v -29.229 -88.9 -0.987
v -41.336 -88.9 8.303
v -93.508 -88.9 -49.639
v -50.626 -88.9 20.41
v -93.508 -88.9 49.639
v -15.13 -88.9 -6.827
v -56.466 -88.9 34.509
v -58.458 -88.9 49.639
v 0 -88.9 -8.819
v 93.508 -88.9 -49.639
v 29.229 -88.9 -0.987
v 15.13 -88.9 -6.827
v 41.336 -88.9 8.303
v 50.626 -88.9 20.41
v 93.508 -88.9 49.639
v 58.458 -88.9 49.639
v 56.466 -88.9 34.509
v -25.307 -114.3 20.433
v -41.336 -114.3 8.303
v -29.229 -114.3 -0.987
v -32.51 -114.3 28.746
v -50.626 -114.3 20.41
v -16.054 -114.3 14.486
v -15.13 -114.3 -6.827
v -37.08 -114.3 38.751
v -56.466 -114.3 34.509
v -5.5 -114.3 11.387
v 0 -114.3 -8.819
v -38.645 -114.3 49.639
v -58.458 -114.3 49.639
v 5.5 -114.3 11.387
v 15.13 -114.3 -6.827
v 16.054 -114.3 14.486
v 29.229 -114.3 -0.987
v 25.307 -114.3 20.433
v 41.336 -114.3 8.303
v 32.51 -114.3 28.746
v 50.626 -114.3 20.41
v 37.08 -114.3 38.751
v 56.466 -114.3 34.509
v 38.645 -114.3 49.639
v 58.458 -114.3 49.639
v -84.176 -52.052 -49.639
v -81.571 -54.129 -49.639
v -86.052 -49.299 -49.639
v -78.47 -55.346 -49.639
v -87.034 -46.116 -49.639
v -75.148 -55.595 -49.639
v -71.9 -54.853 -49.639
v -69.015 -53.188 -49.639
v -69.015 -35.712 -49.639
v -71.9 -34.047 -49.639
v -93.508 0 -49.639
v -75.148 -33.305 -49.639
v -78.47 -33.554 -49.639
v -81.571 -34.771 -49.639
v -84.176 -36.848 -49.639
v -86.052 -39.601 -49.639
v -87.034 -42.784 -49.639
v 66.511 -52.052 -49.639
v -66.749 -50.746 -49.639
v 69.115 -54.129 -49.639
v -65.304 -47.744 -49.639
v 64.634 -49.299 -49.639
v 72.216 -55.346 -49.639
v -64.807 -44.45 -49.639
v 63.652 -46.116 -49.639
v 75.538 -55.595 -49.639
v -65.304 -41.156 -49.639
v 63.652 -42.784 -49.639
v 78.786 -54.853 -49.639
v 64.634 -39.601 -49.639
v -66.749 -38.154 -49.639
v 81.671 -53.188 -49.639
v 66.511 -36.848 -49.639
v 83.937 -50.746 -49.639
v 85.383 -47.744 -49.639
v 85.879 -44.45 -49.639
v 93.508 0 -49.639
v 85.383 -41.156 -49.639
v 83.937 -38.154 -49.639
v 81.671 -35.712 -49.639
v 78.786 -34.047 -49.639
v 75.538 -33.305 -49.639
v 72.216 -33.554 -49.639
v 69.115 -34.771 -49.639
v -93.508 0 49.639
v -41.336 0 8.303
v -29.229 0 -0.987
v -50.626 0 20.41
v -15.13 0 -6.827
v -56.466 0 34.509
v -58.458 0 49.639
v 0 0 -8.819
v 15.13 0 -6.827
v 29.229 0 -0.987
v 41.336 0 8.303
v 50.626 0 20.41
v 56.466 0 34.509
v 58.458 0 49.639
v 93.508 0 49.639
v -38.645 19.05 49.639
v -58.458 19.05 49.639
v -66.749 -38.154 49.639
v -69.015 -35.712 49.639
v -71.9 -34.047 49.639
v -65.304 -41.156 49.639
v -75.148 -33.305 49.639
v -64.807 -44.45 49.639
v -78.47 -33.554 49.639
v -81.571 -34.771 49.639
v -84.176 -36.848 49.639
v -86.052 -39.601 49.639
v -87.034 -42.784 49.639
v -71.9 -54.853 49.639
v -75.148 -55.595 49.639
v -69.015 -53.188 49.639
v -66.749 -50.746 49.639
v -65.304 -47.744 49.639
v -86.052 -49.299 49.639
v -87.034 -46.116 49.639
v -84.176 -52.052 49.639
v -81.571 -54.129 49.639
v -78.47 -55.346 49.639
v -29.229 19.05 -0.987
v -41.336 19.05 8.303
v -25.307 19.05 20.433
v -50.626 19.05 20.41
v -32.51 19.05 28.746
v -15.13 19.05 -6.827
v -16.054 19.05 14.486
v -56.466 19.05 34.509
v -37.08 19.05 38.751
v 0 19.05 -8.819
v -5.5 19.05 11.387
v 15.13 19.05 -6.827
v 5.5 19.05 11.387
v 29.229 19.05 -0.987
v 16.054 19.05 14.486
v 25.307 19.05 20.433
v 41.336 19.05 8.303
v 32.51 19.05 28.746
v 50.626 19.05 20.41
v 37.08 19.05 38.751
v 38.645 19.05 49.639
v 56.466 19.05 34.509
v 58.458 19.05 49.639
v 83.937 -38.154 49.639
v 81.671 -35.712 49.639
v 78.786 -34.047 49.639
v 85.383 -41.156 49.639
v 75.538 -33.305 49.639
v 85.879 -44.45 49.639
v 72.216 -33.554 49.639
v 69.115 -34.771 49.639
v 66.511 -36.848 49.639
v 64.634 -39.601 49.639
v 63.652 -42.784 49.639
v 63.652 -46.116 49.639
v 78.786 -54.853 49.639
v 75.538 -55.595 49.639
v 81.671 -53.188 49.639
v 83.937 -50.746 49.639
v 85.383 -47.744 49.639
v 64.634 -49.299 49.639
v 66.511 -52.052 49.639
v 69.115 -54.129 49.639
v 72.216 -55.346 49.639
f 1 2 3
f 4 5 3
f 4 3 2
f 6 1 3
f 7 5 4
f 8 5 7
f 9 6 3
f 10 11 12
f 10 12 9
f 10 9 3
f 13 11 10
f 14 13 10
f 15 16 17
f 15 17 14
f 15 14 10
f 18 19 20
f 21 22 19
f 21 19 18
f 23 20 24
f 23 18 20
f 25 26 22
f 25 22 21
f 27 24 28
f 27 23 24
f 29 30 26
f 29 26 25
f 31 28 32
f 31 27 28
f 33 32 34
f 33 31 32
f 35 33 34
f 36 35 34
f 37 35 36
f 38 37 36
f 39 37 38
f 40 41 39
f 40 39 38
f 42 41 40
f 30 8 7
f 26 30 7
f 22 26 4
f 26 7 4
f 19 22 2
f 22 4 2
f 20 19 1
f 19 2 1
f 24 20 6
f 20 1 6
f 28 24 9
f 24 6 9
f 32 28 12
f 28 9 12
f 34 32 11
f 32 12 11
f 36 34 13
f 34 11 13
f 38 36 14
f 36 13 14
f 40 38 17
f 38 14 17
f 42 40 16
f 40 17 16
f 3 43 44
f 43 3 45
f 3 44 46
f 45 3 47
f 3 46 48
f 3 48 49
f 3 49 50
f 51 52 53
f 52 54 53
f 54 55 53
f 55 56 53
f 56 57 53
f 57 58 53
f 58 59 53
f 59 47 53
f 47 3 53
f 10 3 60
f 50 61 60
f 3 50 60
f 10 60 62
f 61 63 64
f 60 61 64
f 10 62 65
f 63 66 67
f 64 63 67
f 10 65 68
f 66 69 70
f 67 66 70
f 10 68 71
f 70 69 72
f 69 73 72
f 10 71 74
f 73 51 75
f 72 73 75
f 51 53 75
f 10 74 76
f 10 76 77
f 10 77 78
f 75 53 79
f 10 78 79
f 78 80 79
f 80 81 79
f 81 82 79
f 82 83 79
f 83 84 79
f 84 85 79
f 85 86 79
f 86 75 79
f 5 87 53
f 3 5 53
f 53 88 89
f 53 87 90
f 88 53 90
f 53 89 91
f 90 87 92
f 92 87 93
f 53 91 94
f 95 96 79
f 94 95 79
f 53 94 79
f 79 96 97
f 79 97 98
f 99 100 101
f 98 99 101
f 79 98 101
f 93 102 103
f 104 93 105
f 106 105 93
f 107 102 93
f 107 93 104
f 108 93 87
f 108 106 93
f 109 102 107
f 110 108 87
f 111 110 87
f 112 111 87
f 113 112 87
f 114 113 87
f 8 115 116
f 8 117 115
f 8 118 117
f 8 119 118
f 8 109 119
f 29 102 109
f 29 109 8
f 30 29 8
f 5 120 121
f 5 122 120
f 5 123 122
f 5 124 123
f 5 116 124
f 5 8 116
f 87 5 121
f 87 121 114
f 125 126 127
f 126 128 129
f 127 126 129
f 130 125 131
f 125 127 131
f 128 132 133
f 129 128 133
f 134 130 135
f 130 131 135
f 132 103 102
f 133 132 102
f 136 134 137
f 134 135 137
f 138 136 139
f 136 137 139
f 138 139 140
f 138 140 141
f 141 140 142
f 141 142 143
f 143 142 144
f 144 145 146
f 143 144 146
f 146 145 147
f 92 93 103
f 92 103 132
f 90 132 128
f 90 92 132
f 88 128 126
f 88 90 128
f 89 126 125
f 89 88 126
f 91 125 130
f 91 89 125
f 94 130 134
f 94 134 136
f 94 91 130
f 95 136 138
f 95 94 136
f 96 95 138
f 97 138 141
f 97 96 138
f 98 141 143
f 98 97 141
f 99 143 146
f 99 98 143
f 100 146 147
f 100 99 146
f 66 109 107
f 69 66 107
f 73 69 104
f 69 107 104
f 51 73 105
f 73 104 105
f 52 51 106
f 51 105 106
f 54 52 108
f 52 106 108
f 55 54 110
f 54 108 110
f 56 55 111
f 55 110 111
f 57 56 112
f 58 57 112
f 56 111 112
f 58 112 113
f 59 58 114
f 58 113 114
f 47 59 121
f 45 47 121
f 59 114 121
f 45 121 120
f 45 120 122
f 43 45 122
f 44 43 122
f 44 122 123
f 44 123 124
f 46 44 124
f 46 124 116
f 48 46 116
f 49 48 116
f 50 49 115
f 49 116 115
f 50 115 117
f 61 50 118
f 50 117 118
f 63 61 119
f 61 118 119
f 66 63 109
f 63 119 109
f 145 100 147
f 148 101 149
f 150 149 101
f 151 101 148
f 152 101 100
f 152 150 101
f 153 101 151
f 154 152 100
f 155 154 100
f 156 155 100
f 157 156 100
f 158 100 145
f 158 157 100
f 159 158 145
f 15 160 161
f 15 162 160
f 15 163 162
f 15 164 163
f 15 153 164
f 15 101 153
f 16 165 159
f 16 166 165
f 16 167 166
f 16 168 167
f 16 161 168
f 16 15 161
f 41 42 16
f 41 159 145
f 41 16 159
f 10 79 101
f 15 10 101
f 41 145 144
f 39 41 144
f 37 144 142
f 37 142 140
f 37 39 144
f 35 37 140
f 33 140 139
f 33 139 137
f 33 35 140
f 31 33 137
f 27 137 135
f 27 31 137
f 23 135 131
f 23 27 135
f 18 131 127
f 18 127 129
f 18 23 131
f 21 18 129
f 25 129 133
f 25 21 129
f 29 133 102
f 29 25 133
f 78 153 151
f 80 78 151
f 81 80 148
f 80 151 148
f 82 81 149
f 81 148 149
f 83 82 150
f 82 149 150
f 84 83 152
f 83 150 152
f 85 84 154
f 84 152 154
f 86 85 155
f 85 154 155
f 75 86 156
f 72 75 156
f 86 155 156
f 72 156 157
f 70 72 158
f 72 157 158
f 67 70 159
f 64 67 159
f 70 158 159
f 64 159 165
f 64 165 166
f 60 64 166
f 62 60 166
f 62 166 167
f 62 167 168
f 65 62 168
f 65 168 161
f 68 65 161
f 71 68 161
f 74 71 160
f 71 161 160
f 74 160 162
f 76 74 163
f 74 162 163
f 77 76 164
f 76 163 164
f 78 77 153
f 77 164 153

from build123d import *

# Parameters (mm, degrees)
F1_DEPTH      = 88.9
F3_DEPTH      = 25.4
F3_DEPTH_BACK = 107.95
F4_R          = 11.176
F5_DEPTH      = 99.27772


with BuildPart() as f1:
    # F0 (on Front) → F1 (new body)
    with BuildSketch(Plane.XZ):
        with BuildLine():
            Line((93.508288, -49.63886), (93.508288, 49.63886))
            Line((93.508288, 49.63886), (58.457912, 49.63886))
            ThreePointArc((58.457912, 49.63886), (0, -8.819052), (-58.457912, 49.63886))
            Line((-58.457912, 49.63886), (-93.508288, 49.63886))
            Line((-93.508288, 49.63886), (-93.508288, -49.63886))
            Line((-93.508288, -49.63886), (93.508288, -49.63886))
        make_face()
    extrude(amount=F1_DEPTH)

    # F2 (on face) → F3 (join, two sides)
    with BuildSketch(Plane.XZ.offset(88.9)) as f3_sk:
        with BuildLine():
            Line((-38.644901, 49.63886), (-58.457912, 49.63886))
            ThreePointArc((-58.457912, 49.63886), (0, -8.819052), (58.457912, 49.63886))
            Line((58.457912, 49.63886), (38.644901, 49.63886))
            ThreePointArc((38.644901, 49.63886), (0, 10.993959), (-38.644901, 49.63886))
        make_face()
    extrude(amount=F3_DEPTH)
    extrude(f3_sk.sketch, amount=-F3_DEPTH_BACK)

    # F4 (on face) → F5 (cut, through all)
    with BuildSketch(Plane.XY.offset(49.63886)):
        with Locations((-75.9831, -44.45)):
            Circle(F4_R)
        with Locations((74.703217, -44.45)):
            Circle(F4_R)
    extrude(amount=-F5_DEPTH, mode=Mode.SUBTRACT)


solid = f1.part
